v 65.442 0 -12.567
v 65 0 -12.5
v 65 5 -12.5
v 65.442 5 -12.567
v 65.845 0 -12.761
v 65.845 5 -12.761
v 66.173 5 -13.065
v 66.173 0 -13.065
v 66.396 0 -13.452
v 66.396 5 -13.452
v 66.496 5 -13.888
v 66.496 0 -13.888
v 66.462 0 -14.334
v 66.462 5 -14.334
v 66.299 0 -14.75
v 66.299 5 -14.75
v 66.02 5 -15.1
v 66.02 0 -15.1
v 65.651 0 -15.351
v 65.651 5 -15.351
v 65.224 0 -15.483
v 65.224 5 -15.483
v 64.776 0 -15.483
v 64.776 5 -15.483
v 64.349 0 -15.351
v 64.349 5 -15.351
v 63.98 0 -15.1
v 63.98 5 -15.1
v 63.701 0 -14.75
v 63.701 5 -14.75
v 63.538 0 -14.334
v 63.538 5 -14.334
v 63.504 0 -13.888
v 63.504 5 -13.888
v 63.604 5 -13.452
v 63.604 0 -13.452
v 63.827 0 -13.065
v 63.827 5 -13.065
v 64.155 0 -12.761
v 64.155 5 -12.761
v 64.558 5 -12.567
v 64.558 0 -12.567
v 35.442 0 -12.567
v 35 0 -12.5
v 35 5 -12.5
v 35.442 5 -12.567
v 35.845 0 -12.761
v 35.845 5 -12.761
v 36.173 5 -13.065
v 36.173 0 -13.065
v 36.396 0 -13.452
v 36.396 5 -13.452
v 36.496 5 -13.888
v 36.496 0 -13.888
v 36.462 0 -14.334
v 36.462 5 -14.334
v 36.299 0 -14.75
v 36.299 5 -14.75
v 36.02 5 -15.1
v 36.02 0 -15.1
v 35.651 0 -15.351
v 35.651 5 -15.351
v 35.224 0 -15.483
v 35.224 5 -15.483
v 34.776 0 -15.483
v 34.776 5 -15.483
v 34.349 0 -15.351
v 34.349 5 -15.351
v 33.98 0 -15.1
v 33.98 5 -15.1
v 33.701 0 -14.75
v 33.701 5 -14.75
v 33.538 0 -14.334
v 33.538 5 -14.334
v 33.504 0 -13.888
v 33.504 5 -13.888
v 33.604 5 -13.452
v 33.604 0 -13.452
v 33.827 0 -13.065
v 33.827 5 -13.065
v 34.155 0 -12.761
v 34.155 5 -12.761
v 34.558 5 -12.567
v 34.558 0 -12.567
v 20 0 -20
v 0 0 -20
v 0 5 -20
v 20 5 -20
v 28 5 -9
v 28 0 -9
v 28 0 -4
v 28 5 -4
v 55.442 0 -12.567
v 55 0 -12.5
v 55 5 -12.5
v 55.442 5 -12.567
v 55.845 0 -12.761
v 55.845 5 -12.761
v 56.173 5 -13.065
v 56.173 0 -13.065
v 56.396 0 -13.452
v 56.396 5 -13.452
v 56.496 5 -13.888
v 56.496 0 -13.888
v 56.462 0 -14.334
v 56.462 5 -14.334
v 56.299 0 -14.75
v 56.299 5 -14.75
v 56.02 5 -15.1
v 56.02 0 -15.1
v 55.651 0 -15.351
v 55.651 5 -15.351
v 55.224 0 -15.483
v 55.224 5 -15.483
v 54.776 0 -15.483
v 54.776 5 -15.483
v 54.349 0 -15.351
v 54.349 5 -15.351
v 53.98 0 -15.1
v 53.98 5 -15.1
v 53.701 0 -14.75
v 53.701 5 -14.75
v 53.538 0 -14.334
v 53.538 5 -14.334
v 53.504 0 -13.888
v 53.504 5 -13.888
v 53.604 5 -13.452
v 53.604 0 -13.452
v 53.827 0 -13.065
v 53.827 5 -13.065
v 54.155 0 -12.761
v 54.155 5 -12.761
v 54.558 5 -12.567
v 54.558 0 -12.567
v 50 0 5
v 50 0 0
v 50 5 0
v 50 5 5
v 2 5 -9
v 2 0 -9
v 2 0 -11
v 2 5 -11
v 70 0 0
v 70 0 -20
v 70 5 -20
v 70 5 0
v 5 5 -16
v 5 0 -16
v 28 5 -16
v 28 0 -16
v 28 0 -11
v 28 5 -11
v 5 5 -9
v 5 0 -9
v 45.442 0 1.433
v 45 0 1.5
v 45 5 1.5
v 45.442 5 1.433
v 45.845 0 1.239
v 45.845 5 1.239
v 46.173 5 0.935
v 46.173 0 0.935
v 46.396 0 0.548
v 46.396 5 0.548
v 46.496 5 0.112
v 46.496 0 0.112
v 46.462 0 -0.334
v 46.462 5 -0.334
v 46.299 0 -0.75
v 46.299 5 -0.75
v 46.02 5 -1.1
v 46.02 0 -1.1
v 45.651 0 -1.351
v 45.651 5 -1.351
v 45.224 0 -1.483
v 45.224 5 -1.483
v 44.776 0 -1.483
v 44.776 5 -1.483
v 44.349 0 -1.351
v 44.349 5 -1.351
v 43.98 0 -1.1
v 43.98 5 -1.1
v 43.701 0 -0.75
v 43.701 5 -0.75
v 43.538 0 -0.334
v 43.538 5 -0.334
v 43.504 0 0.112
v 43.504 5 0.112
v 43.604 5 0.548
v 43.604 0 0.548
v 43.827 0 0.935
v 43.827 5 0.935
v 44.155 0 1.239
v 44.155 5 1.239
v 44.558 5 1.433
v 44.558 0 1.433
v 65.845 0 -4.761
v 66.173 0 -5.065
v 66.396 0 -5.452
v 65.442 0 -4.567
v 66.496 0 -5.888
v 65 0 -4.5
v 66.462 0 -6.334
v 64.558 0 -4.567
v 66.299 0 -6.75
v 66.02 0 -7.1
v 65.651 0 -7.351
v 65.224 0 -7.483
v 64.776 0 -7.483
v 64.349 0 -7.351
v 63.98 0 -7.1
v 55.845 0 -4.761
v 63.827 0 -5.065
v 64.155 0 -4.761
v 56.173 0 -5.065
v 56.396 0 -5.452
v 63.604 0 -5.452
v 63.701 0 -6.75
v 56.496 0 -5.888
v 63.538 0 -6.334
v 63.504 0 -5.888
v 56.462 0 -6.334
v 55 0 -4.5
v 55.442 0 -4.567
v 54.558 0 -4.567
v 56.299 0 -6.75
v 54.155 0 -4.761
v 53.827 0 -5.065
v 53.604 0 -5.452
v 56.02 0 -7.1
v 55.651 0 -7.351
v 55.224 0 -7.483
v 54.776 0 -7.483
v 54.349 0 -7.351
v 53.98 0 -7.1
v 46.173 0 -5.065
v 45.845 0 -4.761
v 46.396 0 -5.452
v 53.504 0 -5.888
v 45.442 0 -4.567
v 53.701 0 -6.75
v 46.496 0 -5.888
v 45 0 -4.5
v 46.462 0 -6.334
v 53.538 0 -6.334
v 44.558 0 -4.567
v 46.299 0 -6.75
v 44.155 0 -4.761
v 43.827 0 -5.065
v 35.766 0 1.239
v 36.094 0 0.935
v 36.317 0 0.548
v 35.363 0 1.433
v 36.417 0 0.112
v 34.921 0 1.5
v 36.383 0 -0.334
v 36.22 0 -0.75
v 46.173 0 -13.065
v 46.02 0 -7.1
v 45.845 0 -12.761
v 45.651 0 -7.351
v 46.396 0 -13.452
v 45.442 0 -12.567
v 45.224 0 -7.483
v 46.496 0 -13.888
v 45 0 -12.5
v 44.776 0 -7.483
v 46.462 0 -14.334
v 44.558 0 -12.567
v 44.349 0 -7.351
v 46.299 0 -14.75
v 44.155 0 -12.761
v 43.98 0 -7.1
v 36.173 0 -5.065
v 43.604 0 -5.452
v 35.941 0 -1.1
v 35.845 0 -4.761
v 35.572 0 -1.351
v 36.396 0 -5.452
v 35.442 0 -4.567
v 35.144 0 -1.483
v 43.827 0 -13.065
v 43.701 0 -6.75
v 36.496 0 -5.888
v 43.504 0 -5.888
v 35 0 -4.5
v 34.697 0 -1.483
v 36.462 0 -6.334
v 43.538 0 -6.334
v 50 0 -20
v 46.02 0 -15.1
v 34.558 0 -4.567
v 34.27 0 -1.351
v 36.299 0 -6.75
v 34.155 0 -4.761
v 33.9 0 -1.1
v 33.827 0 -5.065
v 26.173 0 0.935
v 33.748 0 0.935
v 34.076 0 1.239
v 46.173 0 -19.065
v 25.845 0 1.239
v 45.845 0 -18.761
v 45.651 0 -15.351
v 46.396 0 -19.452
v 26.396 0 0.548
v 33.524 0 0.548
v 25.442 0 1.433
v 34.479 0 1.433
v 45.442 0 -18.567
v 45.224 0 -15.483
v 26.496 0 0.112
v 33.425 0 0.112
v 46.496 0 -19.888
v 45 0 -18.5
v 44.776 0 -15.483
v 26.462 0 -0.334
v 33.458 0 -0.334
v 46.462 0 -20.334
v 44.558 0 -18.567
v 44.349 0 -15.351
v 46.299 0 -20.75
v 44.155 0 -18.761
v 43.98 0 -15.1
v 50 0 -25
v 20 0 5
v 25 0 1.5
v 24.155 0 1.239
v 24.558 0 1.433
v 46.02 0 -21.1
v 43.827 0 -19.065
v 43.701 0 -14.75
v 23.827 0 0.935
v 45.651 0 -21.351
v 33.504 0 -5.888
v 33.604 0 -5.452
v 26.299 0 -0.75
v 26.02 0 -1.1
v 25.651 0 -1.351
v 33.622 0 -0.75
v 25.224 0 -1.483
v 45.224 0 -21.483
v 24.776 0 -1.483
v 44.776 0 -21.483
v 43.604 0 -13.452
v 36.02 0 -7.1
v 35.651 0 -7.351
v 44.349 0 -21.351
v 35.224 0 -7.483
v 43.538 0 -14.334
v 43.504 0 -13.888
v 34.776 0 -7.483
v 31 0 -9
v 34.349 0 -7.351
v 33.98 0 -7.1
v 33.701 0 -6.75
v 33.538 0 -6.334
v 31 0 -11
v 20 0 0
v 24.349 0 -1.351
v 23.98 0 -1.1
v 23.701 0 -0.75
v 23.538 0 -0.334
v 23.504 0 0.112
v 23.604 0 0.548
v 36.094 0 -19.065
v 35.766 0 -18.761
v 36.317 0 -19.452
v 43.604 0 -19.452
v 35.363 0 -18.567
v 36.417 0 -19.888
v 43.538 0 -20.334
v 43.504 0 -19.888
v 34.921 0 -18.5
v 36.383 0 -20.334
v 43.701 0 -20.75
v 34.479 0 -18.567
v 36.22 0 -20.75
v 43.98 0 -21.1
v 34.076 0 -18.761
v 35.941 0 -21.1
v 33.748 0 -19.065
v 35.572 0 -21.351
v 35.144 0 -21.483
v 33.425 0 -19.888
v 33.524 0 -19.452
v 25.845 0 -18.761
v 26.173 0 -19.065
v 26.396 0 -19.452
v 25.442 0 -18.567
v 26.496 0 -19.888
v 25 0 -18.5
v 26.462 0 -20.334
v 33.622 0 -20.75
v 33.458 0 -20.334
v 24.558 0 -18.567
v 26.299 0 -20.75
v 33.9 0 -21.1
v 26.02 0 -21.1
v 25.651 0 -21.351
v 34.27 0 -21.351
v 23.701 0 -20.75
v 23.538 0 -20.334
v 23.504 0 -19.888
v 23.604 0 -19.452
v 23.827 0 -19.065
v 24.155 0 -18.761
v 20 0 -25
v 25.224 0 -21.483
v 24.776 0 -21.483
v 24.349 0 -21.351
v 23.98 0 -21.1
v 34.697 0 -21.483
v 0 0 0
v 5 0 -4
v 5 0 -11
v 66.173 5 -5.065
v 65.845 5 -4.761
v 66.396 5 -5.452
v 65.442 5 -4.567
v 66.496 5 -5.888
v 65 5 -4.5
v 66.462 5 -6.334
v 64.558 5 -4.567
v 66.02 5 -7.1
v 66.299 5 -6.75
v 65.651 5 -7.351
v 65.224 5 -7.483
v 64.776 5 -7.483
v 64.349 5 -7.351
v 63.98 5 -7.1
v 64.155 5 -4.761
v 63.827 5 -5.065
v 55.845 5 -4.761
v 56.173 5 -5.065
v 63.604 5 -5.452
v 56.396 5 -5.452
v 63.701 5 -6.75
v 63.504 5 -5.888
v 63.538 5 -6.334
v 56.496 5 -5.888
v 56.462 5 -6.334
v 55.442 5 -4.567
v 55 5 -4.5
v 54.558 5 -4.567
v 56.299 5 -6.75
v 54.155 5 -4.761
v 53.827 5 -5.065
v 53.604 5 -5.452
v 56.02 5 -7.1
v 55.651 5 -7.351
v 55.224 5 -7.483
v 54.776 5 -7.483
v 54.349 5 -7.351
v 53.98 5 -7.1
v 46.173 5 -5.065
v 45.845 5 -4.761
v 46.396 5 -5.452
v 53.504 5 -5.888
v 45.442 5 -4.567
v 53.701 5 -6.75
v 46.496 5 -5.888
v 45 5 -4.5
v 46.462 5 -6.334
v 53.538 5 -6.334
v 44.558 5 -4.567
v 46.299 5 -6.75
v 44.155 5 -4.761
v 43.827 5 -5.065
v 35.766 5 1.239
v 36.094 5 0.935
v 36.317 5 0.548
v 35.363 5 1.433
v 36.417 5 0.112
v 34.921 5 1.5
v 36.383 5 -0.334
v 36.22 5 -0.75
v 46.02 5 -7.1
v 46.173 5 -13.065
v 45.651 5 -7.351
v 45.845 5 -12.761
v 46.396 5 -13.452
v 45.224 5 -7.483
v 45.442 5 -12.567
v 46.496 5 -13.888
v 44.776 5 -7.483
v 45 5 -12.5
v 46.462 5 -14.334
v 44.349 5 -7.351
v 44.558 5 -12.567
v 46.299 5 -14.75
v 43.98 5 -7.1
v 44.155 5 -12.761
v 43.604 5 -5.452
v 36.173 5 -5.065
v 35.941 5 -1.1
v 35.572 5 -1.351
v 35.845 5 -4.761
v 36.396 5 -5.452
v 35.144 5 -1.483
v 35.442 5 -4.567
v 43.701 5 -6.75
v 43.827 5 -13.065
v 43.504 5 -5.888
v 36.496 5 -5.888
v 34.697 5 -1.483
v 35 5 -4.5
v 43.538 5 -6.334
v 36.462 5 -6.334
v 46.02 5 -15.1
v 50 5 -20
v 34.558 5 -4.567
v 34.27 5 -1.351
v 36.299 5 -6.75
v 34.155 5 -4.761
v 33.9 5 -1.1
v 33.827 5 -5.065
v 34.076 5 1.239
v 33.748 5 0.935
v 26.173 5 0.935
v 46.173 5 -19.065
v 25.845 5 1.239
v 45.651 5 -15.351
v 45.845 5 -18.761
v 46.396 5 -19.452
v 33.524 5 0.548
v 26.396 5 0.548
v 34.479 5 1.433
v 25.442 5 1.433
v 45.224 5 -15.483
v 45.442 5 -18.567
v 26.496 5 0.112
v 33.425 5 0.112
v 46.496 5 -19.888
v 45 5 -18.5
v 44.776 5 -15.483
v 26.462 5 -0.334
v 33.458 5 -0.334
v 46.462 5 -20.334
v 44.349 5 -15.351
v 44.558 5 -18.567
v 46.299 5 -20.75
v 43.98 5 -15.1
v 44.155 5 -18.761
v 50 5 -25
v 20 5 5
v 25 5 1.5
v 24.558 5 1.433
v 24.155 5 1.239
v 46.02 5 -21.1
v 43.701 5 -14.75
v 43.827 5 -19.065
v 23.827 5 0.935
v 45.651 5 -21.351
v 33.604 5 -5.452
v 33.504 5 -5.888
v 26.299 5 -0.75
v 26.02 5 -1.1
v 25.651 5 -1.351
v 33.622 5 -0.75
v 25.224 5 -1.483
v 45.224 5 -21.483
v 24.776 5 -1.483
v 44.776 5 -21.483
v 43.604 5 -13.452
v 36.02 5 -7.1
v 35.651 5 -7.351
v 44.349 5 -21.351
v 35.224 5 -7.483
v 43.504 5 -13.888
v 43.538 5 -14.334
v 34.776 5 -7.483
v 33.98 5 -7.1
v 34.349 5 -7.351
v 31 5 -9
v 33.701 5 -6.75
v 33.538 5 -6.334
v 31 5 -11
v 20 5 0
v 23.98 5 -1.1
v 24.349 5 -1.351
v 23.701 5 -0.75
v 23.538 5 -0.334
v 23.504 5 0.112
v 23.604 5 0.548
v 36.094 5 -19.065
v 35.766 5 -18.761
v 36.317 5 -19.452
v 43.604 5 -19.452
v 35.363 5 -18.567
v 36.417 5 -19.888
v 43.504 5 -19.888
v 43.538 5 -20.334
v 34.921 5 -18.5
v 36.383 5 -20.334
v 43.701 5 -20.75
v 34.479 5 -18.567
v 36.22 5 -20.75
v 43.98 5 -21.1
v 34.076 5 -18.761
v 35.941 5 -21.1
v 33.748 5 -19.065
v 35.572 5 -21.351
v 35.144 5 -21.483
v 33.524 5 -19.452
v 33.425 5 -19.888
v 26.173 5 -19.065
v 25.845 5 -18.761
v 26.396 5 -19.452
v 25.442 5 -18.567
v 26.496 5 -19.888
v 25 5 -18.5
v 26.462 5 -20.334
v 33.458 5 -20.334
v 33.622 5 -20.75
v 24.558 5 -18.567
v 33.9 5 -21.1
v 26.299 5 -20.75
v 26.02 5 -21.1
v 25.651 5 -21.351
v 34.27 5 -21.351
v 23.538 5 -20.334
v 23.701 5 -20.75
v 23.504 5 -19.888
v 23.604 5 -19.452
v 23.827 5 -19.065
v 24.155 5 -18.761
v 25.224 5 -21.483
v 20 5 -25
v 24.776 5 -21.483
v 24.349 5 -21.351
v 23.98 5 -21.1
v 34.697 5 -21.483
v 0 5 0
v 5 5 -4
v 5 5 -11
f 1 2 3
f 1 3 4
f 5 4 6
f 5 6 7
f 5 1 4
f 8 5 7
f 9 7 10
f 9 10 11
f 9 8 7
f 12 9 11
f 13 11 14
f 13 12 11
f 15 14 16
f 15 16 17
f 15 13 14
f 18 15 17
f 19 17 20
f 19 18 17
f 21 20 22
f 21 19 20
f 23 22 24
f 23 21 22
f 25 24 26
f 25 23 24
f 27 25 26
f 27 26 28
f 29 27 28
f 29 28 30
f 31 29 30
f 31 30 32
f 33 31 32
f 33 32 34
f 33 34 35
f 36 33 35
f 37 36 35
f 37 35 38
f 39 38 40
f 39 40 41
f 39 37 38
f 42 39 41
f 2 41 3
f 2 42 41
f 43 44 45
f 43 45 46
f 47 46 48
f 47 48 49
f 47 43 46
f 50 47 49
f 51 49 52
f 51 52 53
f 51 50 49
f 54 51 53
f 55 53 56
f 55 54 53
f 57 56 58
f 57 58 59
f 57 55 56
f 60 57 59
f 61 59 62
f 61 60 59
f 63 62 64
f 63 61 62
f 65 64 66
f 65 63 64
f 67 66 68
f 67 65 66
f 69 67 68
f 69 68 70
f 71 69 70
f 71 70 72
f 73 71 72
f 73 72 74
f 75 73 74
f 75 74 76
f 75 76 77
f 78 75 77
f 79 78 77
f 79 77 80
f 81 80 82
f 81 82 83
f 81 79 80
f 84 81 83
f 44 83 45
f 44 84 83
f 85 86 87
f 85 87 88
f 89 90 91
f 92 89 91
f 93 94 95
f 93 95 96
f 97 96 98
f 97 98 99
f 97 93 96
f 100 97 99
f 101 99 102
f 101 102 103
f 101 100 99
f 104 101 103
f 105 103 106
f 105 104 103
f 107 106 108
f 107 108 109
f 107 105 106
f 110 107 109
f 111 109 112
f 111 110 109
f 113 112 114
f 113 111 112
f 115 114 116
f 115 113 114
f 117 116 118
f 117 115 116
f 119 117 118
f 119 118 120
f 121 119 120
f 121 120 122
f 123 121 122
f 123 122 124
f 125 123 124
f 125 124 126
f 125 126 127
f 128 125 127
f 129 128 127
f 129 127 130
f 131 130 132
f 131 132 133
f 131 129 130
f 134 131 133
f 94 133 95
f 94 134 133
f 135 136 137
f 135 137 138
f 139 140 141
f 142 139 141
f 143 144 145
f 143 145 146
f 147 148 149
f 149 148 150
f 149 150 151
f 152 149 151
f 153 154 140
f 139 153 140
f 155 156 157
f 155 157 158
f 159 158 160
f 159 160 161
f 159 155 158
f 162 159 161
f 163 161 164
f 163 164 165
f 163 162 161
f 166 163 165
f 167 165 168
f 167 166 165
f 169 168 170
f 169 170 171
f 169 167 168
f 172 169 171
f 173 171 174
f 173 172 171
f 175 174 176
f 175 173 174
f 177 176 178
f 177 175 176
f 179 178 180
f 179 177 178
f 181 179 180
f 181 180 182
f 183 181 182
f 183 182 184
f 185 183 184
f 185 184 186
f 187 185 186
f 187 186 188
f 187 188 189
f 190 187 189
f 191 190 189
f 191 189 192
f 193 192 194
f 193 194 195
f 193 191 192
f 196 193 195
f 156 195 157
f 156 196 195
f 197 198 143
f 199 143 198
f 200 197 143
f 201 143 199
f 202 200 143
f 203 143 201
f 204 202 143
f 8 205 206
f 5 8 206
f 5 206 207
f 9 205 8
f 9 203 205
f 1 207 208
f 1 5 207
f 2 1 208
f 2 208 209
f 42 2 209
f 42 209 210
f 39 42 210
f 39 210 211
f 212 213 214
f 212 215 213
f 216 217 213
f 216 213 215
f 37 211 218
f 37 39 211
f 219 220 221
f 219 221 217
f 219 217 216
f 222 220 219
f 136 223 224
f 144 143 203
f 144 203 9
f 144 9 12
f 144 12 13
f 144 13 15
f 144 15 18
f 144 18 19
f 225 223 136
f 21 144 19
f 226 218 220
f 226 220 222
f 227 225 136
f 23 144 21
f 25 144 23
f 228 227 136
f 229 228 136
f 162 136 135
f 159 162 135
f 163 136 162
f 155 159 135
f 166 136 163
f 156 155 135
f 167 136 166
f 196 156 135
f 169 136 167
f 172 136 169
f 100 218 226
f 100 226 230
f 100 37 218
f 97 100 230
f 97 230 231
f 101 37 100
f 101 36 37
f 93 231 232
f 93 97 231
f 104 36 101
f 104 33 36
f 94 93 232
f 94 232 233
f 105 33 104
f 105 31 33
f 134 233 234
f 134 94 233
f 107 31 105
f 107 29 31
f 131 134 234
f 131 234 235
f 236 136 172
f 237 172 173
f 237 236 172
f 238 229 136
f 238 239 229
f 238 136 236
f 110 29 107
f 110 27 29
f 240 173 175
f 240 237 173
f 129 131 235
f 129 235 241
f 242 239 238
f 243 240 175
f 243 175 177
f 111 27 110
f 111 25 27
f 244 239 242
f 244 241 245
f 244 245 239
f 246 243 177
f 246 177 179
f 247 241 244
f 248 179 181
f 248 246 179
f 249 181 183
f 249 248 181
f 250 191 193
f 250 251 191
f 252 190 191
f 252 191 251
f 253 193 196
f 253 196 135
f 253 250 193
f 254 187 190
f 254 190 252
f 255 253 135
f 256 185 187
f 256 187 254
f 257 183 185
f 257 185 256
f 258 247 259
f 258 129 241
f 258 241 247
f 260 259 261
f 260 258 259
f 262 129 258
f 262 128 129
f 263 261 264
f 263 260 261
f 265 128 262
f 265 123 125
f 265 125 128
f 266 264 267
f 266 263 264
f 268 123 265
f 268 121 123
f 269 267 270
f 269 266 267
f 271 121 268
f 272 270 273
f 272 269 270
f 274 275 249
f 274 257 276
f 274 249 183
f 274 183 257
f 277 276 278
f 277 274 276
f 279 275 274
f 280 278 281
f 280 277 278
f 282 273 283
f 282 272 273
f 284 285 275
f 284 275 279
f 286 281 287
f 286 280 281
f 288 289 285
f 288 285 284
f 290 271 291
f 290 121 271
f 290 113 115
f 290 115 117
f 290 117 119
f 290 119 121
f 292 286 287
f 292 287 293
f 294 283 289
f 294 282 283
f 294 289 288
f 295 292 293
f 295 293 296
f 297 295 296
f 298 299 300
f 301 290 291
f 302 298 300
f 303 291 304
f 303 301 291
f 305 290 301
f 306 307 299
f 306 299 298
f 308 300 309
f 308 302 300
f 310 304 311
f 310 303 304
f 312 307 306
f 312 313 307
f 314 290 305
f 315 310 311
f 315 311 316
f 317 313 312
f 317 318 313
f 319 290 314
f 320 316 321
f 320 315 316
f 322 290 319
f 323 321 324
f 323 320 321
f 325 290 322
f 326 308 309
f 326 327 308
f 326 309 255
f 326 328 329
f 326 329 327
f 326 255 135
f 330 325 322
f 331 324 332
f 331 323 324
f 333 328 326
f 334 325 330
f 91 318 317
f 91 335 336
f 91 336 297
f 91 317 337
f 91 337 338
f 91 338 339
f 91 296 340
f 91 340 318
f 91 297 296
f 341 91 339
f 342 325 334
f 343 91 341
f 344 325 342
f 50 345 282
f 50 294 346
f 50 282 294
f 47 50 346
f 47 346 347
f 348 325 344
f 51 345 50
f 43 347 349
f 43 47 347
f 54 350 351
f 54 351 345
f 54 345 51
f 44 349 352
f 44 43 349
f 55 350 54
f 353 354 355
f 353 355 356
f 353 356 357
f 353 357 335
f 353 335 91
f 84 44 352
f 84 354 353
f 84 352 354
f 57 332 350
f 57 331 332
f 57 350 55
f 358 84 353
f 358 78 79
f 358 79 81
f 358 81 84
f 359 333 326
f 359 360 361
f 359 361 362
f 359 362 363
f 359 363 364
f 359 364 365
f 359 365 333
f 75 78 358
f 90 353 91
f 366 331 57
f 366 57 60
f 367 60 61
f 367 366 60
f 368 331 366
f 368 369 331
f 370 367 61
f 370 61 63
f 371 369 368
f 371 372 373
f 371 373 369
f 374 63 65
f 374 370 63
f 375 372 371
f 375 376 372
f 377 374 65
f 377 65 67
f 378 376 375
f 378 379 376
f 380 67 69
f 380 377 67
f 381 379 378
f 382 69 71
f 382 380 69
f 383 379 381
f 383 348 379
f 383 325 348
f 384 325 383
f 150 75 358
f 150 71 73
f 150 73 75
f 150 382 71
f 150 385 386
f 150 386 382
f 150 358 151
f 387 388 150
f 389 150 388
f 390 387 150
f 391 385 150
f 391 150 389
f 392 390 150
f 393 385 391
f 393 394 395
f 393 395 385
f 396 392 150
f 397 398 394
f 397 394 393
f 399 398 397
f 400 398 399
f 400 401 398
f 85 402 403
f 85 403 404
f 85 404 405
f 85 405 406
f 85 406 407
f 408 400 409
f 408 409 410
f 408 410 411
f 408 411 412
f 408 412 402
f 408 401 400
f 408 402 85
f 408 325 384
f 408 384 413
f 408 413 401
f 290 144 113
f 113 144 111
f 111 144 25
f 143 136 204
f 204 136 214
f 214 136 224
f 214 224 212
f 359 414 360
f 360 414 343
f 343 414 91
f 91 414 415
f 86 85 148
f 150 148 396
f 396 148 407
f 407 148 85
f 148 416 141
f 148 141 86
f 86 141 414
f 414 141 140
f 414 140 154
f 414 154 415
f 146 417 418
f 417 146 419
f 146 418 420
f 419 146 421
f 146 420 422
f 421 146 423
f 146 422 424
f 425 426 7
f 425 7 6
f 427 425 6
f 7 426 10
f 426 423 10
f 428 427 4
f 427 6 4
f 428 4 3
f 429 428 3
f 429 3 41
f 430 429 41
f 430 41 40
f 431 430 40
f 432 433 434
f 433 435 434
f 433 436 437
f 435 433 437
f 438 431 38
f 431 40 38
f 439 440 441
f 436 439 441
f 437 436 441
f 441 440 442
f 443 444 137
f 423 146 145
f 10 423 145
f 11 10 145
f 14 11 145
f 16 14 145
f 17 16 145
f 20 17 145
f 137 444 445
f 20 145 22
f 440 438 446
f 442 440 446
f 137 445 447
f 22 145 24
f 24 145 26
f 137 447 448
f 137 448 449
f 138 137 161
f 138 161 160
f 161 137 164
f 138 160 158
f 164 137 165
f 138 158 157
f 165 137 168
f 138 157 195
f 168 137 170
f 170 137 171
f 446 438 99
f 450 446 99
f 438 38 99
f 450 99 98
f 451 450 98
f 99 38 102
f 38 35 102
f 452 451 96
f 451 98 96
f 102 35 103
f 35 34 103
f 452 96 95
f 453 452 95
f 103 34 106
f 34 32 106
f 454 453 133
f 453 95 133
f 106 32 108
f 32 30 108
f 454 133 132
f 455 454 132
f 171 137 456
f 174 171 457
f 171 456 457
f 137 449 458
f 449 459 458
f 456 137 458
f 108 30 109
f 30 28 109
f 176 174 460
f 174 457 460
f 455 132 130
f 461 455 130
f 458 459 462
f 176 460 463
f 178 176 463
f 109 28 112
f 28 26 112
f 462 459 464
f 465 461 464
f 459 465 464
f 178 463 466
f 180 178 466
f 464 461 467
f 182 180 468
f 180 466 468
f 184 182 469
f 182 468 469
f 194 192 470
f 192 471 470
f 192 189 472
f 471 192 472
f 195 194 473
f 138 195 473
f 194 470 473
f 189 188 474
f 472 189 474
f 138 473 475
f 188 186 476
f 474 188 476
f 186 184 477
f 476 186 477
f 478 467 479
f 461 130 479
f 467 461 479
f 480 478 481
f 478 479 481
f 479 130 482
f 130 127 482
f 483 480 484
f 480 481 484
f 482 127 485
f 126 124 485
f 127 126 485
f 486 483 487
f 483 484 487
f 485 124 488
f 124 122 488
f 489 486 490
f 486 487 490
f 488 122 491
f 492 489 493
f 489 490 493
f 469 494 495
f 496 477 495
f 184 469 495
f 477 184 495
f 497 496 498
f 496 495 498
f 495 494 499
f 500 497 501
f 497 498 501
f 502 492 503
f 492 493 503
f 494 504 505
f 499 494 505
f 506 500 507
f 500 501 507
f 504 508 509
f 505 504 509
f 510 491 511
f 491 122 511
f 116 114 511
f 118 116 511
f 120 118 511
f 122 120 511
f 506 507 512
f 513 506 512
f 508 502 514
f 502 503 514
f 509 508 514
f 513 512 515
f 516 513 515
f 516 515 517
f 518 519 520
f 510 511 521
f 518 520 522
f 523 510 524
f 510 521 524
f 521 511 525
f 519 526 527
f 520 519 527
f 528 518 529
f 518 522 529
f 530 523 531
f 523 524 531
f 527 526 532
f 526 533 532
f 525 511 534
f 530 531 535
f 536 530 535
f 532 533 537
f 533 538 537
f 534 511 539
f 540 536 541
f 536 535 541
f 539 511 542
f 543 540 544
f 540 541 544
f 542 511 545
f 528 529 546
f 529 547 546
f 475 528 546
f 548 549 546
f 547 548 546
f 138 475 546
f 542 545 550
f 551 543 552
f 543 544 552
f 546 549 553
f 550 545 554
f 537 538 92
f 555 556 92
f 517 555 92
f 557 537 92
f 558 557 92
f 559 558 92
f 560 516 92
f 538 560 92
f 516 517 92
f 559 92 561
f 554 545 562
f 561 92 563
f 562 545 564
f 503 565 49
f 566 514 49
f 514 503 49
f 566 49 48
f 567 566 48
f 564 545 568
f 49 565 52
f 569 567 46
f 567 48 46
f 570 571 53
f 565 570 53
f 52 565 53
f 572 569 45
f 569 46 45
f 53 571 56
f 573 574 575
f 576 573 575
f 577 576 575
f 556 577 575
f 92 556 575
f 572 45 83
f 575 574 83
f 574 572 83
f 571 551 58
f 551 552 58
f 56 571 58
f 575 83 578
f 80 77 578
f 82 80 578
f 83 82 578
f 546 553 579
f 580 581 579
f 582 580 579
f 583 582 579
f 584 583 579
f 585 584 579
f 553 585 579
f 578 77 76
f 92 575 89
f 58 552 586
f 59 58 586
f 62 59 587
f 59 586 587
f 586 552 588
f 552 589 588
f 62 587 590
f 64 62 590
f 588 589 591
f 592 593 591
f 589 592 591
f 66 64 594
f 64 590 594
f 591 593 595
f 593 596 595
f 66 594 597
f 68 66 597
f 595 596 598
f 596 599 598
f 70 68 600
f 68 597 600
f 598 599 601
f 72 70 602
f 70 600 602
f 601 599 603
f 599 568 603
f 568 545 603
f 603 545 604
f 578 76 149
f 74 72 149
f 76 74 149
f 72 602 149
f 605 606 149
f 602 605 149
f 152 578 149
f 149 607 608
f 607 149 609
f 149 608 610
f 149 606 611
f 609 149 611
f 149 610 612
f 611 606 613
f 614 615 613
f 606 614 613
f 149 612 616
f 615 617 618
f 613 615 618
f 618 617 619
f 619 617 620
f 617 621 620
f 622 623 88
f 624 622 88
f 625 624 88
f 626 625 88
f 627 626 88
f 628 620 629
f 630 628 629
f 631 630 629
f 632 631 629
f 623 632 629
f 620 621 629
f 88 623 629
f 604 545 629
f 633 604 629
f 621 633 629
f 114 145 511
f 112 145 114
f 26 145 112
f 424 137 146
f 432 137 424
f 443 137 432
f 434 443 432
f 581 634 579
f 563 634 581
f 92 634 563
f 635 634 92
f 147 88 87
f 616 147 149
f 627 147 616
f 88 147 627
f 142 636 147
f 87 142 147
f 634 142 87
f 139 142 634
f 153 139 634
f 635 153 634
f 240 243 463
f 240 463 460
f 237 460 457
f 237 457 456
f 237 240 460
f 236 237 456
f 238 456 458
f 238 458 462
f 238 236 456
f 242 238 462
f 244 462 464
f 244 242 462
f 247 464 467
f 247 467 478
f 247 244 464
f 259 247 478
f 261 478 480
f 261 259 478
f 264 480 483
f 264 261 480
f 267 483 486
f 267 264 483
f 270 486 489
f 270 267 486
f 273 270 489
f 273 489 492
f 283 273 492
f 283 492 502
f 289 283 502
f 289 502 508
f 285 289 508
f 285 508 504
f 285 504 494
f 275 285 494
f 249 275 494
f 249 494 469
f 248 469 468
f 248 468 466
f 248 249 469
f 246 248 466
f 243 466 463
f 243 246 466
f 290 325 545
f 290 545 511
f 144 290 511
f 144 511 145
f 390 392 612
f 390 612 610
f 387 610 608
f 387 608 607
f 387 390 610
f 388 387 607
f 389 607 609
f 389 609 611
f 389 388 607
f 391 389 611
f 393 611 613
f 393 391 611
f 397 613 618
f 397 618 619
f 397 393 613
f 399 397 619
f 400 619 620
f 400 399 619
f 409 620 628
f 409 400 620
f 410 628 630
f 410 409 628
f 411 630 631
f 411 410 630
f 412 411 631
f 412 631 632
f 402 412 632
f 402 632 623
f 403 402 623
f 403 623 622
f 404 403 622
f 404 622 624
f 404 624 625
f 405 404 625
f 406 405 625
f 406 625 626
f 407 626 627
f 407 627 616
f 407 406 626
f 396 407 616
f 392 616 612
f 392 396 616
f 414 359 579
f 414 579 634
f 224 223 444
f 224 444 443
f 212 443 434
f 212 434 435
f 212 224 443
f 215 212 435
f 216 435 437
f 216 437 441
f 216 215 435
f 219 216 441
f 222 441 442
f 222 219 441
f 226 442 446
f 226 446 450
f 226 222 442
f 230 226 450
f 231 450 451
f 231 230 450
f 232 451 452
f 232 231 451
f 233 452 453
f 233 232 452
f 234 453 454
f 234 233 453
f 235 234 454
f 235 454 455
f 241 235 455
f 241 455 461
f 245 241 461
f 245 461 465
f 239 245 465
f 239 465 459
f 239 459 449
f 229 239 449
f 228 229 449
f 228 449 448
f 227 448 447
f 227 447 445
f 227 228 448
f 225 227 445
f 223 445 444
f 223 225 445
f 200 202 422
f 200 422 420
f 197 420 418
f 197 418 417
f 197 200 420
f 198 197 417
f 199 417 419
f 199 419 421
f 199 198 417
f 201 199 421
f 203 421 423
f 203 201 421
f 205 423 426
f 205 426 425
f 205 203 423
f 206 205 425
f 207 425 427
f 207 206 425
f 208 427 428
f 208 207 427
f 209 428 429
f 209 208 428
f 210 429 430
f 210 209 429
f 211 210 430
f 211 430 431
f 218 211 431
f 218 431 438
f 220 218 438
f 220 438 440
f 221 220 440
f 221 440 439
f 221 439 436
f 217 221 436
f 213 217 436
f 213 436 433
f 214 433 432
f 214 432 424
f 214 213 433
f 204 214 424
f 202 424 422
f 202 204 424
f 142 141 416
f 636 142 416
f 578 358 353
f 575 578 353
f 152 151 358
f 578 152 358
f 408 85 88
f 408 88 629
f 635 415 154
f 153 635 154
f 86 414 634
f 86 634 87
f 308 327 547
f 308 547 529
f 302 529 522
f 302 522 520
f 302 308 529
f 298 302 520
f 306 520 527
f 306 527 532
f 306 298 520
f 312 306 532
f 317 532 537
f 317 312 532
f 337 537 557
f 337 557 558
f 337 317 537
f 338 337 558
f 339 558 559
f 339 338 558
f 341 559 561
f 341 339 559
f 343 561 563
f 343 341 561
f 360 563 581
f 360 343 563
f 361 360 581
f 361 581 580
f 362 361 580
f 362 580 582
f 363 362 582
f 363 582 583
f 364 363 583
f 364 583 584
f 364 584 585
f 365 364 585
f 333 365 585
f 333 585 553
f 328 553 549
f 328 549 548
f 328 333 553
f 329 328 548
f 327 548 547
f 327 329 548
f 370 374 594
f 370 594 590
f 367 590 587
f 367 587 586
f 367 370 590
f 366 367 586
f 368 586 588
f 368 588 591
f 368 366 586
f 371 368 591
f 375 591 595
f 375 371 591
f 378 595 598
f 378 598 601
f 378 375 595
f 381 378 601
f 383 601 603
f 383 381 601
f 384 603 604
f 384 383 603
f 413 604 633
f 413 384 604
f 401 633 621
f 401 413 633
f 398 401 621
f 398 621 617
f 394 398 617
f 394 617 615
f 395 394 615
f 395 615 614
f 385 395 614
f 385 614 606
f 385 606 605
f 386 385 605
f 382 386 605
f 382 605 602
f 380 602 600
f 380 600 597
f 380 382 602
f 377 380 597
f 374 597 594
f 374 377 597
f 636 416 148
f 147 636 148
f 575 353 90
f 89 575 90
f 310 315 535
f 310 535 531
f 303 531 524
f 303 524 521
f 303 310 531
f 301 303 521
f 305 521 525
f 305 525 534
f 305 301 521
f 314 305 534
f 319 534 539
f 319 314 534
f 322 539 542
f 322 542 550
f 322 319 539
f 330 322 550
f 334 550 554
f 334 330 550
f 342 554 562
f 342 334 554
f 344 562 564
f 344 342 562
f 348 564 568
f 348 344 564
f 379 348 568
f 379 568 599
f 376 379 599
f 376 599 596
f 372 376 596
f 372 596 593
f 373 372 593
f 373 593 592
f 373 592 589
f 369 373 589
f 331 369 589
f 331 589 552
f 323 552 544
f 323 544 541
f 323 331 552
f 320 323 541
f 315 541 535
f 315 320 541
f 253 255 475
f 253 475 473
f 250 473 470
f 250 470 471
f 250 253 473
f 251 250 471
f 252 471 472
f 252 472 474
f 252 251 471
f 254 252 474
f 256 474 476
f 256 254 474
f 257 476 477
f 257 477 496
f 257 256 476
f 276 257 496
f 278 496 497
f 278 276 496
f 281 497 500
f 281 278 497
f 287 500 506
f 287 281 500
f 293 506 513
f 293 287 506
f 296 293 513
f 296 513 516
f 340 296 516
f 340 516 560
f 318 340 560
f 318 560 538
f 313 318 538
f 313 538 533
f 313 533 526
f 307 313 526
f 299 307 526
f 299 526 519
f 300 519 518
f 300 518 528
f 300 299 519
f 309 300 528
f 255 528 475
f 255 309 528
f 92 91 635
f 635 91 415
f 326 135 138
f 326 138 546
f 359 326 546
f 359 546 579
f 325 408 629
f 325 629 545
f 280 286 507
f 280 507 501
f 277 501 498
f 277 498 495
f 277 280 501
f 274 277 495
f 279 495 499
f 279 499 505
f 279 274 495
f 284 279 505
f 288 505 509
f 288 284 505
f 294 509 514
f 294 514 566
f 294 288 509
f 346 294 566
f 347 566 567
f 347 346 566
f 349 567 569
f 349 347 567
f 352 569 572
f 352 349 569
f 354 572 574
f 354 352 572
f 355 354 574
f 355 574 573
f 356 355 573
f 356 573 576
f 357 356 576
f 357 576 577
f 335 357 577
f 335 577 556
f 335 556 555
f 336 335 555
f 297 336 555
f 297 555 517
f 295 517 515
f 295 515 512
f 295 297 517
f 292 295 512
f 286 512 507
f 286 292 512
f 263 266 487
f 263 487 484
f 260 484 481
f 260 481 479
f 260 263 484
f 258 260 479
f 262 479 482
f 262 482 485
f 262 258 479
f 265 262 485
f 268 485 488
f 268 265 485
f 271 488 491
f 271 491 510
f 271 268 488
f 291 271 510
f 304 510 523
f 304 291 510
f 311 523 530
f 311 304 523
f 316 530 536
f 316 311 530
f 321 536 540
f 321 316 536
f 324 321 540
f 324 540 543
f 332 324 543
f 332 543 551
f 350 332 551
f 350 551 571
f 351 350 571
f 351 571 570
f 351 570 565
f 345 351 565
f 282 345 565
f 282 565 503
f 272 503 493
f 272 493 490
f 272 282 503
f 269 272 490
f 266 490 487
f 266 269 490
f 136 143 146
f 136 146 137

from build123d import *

# Parameters (mm, degrees)
SKETCH_1_R      = 1.5
EXTRUDE_1_DEPTH = 5


with BuildPart() as part:
    # 草图1 → 凸台-拉伸1 (new body)
    with BuildSketch(Plane(origin=(0, 0, 0), x_dir=(1, 0, 0), z_dir=(0, 1, 0))):
        Polygon((50, 20), (70, 20), (70, 0), (50, 0), (50, -5), (20, -5), (20, 0), (0, 0), (0, 20), (20, 20), (20, 25), (50, 25), align=None)
        with Locations(Location((25, 20, 0), (0, 0, 270))):
            Circle(SKETCH_1_R, mode=Mode.SUBTRACT)
        with Locations(Location((34.920753824, 20, 0), (0, 0, 270))):
            Circle(SKETCH_1_R, mode=Mode.SUBTRACT)
        with Locations(Location((45, 20, 0), (0, 0, 270))):
            Circle(SKETCH_1_R, mode=Mode.SUBTRACT)
        with Locations(Location((35, 14, 0), (0, 0, 270))):
            Circle(SKETCH_1_R, mode=Mode.SUBTRACT)
        with Locations(Location((45, 14, 0), (0, 0, 270))):
            Circle(SKETCH_1_R, mode=Mode.SUBTRACT)
        with Locations(Location((35, 6, 0), (0, 0, 270))):
            Circle(SKETCH_1_R, mode=Mode.SUBTRACT)
        with Locations(Location((34.920753824, 0, 0), (0, 0, 270))):
            Circle(SKETCH_1_R, mode=Mode.SUBTRACT)
        with Locations(Location((45, 0, 0), (0, 0, 270))):
            Circle(SKETCH_1_R, mode=Mode.SUBTRACT)
        with Locations(Location((45, 6, 0), (0, 0, 270))):
            Circle(SKETCH_1_R, mode=Mode.SUBTRACT)
        with Locations(Location((55, 14, 0), (0, 0, 270))):
            Circle(SKETCH_1_R, mode=Mode.SUBTRACT)
        with Locations(Location((55, 6, 0), (0, 0, 270))):
            Circle(SKETCH_1_R, mode=Mode.SUBTRACT)
        with Locations(Location((65, 14, 0), (0, 0, 270))):
            Circle(SKETCH_1_R, mode=Mode.SUBTRACT)
        with Locations(Location((65, 6, 0), (0, 0, 270))):
            Circle(SKETCH_1_R, mode=Mode.SUBTRACT)
        with Locations(Location((25, 0, 0), (0, 0, 270))):
            Circle(SKETCH_1_R, mode=Mode.SUBTRACT)
        Polygon((5, 16), (28, 16), (28, 11), (31, 11), (31, 9), (28, 9), (28, 4), (5, 4), (5, 9), (2, 9), (2, 11), (5, 11), align=None, mode=Mode.SUBTRACT)
    extrude(amount=EXTRUDE_1_DEPTH)


solid = part.part
